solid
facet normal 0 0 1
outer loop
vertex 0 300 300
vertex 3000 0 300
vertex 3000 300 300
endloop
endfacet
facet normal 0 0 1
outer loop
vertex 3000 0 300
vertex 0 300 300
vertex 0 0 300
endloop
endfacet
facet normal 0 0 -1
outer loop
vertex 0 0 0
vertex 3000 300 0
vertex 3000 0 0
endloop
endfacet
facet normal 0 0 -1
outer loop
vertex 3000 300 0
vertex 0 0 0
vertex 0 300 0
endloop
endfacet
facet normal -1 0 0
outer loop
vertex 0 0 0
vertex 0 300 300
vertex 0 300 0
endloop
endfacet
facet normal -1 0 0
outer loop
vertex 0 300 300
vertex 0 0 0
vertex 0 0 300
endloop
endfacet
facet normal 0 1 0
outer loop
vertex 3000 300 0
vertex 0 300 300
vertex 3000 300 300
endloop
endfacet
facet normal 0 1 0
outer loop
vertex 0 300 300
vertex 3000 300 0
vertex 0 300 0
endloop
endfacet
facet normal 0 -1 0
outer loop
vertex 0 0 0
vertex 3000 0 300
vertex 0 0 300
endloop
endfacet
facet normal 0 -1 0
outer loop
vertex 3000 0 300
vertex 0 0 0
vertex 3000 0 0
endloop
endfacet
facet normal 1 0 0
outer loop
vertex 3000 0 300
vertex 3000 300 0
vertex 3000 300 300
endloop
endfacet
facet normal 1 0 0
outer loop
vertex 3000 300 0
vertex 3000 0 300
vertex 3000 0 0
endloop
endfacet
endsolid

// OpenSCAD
//purples();
//pinks();
//blues();
//reds();
//greens();
//oranges();
//yellows();
//browns();
//whites();
grays();

module grays(){
color("Gainsboro")cube(300);
translate([300,0,0])
color("LightGrey")
cube(300);
translate([2*300,0,0])
color("Silver")
cube(300);
translate([3*300,0,0])
color("DarkGray")
cube(300);
translate([4*300,0,0])
color("Gray")
cube(300);
translate([5*300,0,0])
color("DimGray")
cube(300);
translate([6*300,0,0])
color("LightSlateGray")
cube(300);
translate([7*300,0,0])
color("SlateGray")
cube(300);
translate([8*300,0,0])
color("DarkSlateGray")
cube(300);
translate([9*300,0,0])
color("Black")
cube(300);

}



module whites(){
color("White")cube(300);
translate([300,0,0])
color("Snow")
cube(300);
translate([2*300,0,0])
color("Honeydew")
cube(300);
translate([3*300,0,0])
color("MintCream")
cube(300);
translate([4*300,0,0])
color("Azure")
cube(300);
translate([5*300,0,0])
color("AliceBlue")
cube(300);
translate([6*300,0,0])
color("GhostWhite")
cube(300);
translate([7*300,0,0])
color("WhiteSmoke")
cube(300);
translate([8*300,0,0])
color("Seashell")
cube(300);
translate([9*300,0,0])
color("Beige")
cube(300);
translate([10*300,0,0])
color("OldLace")
cube(300);
translate([11*300,0,0])
color("FloralWhite")
cube(300);
translate([12*300,0,0])
color("Ivory")
cube(300);
translate([13*300,0,0])
color("AntiqueWhite")
cube(300);
translate([14*300,0,0])
color("Linen")
cube(300);
translate([15*300,0,0])
color("LavenderBlush")
cube(300);
translate([16*300,0,0])
color("MistyRose")
cube(300);

}


module browns(){
color("Cornsilk")cube(300);
translate([300,0,0])
color("BlanchedAlmond")
cube(300);
translate([2*300,0,0])
color("Bisque")
cube(300);
translate([3*300,0,0])
color("NavajoWhite")
cube(300);
translate([4*300,0,0])
color("Wheat")
cube(300);
translate([5*300,0,0])
color("BurlyWood")
cube(300);
translate([6*300,0,0])
color("Tan")
cube(300);
translate([7*300,0,0])
color("RosyBrown")
cube(300);
translate([8*300,0,0])
color("SandyBrown")
cube(300);
color("Goldenrod")cube(300);
translate([9*300,0,0])
color("DarkGoldenrod")
cube(300);
translate([10*300,0,0])
color("Peru")
cube(300);
translate([11*300,0,0])
color("Chocolate")
cube(300);
translate([12*300,0,0])
color("SaddleBrown")
cube(300);
translate([13*300,0,0])
color("Sienna")
cube(300);
translate([14*300,0,0])
color("Brown")
cube(300);
translate([15*300,0,0])
color("Maroon")
cube(300);

}


module yellows(){
color("Gold")cube(300);
translate([300,0,0])
color("Yellow")
cube(300);
translate([2*300,0,0])
color("LightYellow")
cube(300);
translate([3*300,0,0])
color("LemonChiffon")
cube(300);
translate([4*300,0,0])
color("LightGoldenrodYellow")
cube(300);
translate([5*300,0,0])
color("PapayaWhip")
cube(300);
translate([6*300,0,0])
color("Moccasin")
cube(300);
translate([7*300,0,0])
color("PeachPuff")
cube(300);
translate([8*300,0,0])
color("PaleGoldenrod")
cube(300);
color("Khaki")cube(300);
translate([9*300,0,0])
color("DarkKhaki")
cube(300);

}


module oranges(){
color("LightSalmon")cube(300);
translate([300,0,0])
color("Coral")
cube(300);
translate([2*300,0,0])
color("Tomato")
cube(300);
translate([3*300,0,0])
color("OrangeRed")
cube(300);
translate([4*300,0,0])
color("DarkOrange")
cube(300);
translate([5*300,0,0])
color("Orange")
cube(300);

}



module greens(){
color("GreenYellow")cube(300);
translate([300,0,0])
color("Chartreuse")
cube(300);
translate([2*300,0,0])
color("LawnGreen")
cube(300);
translate([3*300,0,0])
color("Lime")
cube(300);
translate([4*300,0,0])
color("LimeGreen")
cube(300);
translate([5*300,0,0])
color("PaleGreen")
cube(300);
translate([6*300,0,0])
color("LightGreen")
cube(300);
translate([7*300,0,0])
color("MediumSpringGreen")
cube(300);
translate([8*300,0,0])
color("SpringGreen")
cube(300);
color("MediumSeaGreen")cube(300);
translate([9*300,0,0])
color("SeaGreen")
cube(300);
translate([10*300,0,0])
color("ForestGreen")
cube(300);
translate([11*300,0,0])
color("Green")
cube(300);
translate([12*300,0,0])
color("DarkGreen")
cube(300);
translate([13*300,0,0])
color("YellowGreen")
cube(300);
translate([14*300,0,0])
color("OliveDrab")
cube(300);
translate([15*300,0,0])
color("Olive")
cube(300);
translate([16*300,0,0])
color("DarkOliveGreen")
cube(300);
translate([17*300,0,0])
color("MediumAquamarine")
cube(300);
translate([18*300,0,0])
color("DarkSeaGreen")
cube(300);
translate([19*300,0,0])
color("LightSeaGreen")
cube(300);
translate([20*300,0,0])
color("DarkCyan")
cube(300);
translate([21*300,0,0])
color("Teal")
cube(300);
}



module reds(){
color("IndianRed")cube(300);
translate([300,0,0])
color("LightCoral")
cube(300);
translate([2*300,0,0])
color("Salmon")
cube(300);
translate([3*300,0,0])
color("DarkSalmon")
cube(300);
translate([4*300,0,0])
color("LightSalmon")
cube(300);
translate([5*300,0,0])
color("Red")
cube(300);
translate([6*300,0,0])
color("Crimson")
cube(300);
translate([7*300,0,0])
color("FireBrick")
cube(300);
translate([8*300,0,0])
color("DarkRed")
cube(300);

}




module blues(){
color("Aqua")cube(300);
translate([300,0,0])
color("Cyan")
cube(300);
translate([2*300,0,0])
color("LightCyan")
cube(300);
translate([3*300,0,0])
color("PaleTurquoise")
cube(300);
translate([4*300,0,0])
color("Aquamarine")
cube(300);
translate([5*300,0,0])
color("Turquoise")
cube(300);
translate([6*300,0,0])
color("DarkTurquoise")
cube(300);
translate([7*300,0,0])
color("CadetBlue")
cube(300);
translate([8*300,0,0])
color("SteelBlue")
cube(300);
translate([9*300,0,0])
color("LightSteelBlue")
cube(300);
translate([10*300,0,0])
color("PowderBlue")
cube(300);
translate([11*300,0,0])
color("LightBlue")
cube(300);
translate([12*300,0,0])
color("SkyBlue")
cube(300);
translate([13*300,0,0])
color("LightSkyBlue")
cube(300);
translate([14*300,0,0])
color("DeepSkyBlue")
cube(300);
translate([15*300,0,0])
color("DodgerBlue")
cube(300);
translate([16*300,0,0])
color("CornflowerBlue")
cube(300);
translate([17*300,0,0])
color("RoyalBlue")
cube(300);
translate([18*300,0,0])
color("Blue")
cube(300);
translate([19*300,0,0])
color("MediumBlue")
cube(300);
translate([20*300,0,0])
color("DarkBlue")
cube(300);
translate([21*300,0,0])
color("Navy")
cube(300);
translate([22*300,0,0])
color("MidnightBlue")
cube(300);

}



module purples(){
color("Lavender")cube(300);
translate([300,0,0])
color("Thistle")
cube(300);
translate([2*300,0,0])
color("Plum")
cube(300);
translate([3*300,0,0])
color("Violet")
cube(300);
translate([4*300,0,0])
color("Orchid")
cube(300);
translate([5*300,0,0])
color("Fuchsia")
cube(300);
translate([6*300,0,0])
color("Magenta")
cube(300);
translate([7*300,0,0])
color("MediumOrchid")
cube(300);
translate([8*300,0,0])
color("MediumPurple")
cube(300);
translate([9*300,0,0])
color("BlueViolet")
cube(300);
translate([10*300,0,0])
color("DarkViolet")
cube(300);
translate([11*300,0,0])
color("DarkOrchid")
cube(300);
translate([12*300,0,0])
color("DarkMagenta")
cube(300);
translate([13*300,0,0])
color("Purple")
cube(300);
translate([14*300,0,0])
color("Indigo")
cube(300);
translate([15*300,0,0])
color("DarkSlateBlue")
cube(300);
translate([16*300,0,0])
color("SlateBlue")
cube(300);
translate([16*300,0,0])
color("MediumSlateBlue")
cube(300);
}

module pinks(){
color("Pink")cube(300);
translate([300,0,0])
color("LightPink")
cube(300);
translate([2*300,0,0])
color("HotPink")
cube(300);
translate([3*300,0,0])
color("DeepPink")
cube(300);
translate([4*300,0,0])
color("MediumVioletRed")
cube(300);
translate([5*300,0,0])
color("PaleVioletRed")
cube(300);
}
